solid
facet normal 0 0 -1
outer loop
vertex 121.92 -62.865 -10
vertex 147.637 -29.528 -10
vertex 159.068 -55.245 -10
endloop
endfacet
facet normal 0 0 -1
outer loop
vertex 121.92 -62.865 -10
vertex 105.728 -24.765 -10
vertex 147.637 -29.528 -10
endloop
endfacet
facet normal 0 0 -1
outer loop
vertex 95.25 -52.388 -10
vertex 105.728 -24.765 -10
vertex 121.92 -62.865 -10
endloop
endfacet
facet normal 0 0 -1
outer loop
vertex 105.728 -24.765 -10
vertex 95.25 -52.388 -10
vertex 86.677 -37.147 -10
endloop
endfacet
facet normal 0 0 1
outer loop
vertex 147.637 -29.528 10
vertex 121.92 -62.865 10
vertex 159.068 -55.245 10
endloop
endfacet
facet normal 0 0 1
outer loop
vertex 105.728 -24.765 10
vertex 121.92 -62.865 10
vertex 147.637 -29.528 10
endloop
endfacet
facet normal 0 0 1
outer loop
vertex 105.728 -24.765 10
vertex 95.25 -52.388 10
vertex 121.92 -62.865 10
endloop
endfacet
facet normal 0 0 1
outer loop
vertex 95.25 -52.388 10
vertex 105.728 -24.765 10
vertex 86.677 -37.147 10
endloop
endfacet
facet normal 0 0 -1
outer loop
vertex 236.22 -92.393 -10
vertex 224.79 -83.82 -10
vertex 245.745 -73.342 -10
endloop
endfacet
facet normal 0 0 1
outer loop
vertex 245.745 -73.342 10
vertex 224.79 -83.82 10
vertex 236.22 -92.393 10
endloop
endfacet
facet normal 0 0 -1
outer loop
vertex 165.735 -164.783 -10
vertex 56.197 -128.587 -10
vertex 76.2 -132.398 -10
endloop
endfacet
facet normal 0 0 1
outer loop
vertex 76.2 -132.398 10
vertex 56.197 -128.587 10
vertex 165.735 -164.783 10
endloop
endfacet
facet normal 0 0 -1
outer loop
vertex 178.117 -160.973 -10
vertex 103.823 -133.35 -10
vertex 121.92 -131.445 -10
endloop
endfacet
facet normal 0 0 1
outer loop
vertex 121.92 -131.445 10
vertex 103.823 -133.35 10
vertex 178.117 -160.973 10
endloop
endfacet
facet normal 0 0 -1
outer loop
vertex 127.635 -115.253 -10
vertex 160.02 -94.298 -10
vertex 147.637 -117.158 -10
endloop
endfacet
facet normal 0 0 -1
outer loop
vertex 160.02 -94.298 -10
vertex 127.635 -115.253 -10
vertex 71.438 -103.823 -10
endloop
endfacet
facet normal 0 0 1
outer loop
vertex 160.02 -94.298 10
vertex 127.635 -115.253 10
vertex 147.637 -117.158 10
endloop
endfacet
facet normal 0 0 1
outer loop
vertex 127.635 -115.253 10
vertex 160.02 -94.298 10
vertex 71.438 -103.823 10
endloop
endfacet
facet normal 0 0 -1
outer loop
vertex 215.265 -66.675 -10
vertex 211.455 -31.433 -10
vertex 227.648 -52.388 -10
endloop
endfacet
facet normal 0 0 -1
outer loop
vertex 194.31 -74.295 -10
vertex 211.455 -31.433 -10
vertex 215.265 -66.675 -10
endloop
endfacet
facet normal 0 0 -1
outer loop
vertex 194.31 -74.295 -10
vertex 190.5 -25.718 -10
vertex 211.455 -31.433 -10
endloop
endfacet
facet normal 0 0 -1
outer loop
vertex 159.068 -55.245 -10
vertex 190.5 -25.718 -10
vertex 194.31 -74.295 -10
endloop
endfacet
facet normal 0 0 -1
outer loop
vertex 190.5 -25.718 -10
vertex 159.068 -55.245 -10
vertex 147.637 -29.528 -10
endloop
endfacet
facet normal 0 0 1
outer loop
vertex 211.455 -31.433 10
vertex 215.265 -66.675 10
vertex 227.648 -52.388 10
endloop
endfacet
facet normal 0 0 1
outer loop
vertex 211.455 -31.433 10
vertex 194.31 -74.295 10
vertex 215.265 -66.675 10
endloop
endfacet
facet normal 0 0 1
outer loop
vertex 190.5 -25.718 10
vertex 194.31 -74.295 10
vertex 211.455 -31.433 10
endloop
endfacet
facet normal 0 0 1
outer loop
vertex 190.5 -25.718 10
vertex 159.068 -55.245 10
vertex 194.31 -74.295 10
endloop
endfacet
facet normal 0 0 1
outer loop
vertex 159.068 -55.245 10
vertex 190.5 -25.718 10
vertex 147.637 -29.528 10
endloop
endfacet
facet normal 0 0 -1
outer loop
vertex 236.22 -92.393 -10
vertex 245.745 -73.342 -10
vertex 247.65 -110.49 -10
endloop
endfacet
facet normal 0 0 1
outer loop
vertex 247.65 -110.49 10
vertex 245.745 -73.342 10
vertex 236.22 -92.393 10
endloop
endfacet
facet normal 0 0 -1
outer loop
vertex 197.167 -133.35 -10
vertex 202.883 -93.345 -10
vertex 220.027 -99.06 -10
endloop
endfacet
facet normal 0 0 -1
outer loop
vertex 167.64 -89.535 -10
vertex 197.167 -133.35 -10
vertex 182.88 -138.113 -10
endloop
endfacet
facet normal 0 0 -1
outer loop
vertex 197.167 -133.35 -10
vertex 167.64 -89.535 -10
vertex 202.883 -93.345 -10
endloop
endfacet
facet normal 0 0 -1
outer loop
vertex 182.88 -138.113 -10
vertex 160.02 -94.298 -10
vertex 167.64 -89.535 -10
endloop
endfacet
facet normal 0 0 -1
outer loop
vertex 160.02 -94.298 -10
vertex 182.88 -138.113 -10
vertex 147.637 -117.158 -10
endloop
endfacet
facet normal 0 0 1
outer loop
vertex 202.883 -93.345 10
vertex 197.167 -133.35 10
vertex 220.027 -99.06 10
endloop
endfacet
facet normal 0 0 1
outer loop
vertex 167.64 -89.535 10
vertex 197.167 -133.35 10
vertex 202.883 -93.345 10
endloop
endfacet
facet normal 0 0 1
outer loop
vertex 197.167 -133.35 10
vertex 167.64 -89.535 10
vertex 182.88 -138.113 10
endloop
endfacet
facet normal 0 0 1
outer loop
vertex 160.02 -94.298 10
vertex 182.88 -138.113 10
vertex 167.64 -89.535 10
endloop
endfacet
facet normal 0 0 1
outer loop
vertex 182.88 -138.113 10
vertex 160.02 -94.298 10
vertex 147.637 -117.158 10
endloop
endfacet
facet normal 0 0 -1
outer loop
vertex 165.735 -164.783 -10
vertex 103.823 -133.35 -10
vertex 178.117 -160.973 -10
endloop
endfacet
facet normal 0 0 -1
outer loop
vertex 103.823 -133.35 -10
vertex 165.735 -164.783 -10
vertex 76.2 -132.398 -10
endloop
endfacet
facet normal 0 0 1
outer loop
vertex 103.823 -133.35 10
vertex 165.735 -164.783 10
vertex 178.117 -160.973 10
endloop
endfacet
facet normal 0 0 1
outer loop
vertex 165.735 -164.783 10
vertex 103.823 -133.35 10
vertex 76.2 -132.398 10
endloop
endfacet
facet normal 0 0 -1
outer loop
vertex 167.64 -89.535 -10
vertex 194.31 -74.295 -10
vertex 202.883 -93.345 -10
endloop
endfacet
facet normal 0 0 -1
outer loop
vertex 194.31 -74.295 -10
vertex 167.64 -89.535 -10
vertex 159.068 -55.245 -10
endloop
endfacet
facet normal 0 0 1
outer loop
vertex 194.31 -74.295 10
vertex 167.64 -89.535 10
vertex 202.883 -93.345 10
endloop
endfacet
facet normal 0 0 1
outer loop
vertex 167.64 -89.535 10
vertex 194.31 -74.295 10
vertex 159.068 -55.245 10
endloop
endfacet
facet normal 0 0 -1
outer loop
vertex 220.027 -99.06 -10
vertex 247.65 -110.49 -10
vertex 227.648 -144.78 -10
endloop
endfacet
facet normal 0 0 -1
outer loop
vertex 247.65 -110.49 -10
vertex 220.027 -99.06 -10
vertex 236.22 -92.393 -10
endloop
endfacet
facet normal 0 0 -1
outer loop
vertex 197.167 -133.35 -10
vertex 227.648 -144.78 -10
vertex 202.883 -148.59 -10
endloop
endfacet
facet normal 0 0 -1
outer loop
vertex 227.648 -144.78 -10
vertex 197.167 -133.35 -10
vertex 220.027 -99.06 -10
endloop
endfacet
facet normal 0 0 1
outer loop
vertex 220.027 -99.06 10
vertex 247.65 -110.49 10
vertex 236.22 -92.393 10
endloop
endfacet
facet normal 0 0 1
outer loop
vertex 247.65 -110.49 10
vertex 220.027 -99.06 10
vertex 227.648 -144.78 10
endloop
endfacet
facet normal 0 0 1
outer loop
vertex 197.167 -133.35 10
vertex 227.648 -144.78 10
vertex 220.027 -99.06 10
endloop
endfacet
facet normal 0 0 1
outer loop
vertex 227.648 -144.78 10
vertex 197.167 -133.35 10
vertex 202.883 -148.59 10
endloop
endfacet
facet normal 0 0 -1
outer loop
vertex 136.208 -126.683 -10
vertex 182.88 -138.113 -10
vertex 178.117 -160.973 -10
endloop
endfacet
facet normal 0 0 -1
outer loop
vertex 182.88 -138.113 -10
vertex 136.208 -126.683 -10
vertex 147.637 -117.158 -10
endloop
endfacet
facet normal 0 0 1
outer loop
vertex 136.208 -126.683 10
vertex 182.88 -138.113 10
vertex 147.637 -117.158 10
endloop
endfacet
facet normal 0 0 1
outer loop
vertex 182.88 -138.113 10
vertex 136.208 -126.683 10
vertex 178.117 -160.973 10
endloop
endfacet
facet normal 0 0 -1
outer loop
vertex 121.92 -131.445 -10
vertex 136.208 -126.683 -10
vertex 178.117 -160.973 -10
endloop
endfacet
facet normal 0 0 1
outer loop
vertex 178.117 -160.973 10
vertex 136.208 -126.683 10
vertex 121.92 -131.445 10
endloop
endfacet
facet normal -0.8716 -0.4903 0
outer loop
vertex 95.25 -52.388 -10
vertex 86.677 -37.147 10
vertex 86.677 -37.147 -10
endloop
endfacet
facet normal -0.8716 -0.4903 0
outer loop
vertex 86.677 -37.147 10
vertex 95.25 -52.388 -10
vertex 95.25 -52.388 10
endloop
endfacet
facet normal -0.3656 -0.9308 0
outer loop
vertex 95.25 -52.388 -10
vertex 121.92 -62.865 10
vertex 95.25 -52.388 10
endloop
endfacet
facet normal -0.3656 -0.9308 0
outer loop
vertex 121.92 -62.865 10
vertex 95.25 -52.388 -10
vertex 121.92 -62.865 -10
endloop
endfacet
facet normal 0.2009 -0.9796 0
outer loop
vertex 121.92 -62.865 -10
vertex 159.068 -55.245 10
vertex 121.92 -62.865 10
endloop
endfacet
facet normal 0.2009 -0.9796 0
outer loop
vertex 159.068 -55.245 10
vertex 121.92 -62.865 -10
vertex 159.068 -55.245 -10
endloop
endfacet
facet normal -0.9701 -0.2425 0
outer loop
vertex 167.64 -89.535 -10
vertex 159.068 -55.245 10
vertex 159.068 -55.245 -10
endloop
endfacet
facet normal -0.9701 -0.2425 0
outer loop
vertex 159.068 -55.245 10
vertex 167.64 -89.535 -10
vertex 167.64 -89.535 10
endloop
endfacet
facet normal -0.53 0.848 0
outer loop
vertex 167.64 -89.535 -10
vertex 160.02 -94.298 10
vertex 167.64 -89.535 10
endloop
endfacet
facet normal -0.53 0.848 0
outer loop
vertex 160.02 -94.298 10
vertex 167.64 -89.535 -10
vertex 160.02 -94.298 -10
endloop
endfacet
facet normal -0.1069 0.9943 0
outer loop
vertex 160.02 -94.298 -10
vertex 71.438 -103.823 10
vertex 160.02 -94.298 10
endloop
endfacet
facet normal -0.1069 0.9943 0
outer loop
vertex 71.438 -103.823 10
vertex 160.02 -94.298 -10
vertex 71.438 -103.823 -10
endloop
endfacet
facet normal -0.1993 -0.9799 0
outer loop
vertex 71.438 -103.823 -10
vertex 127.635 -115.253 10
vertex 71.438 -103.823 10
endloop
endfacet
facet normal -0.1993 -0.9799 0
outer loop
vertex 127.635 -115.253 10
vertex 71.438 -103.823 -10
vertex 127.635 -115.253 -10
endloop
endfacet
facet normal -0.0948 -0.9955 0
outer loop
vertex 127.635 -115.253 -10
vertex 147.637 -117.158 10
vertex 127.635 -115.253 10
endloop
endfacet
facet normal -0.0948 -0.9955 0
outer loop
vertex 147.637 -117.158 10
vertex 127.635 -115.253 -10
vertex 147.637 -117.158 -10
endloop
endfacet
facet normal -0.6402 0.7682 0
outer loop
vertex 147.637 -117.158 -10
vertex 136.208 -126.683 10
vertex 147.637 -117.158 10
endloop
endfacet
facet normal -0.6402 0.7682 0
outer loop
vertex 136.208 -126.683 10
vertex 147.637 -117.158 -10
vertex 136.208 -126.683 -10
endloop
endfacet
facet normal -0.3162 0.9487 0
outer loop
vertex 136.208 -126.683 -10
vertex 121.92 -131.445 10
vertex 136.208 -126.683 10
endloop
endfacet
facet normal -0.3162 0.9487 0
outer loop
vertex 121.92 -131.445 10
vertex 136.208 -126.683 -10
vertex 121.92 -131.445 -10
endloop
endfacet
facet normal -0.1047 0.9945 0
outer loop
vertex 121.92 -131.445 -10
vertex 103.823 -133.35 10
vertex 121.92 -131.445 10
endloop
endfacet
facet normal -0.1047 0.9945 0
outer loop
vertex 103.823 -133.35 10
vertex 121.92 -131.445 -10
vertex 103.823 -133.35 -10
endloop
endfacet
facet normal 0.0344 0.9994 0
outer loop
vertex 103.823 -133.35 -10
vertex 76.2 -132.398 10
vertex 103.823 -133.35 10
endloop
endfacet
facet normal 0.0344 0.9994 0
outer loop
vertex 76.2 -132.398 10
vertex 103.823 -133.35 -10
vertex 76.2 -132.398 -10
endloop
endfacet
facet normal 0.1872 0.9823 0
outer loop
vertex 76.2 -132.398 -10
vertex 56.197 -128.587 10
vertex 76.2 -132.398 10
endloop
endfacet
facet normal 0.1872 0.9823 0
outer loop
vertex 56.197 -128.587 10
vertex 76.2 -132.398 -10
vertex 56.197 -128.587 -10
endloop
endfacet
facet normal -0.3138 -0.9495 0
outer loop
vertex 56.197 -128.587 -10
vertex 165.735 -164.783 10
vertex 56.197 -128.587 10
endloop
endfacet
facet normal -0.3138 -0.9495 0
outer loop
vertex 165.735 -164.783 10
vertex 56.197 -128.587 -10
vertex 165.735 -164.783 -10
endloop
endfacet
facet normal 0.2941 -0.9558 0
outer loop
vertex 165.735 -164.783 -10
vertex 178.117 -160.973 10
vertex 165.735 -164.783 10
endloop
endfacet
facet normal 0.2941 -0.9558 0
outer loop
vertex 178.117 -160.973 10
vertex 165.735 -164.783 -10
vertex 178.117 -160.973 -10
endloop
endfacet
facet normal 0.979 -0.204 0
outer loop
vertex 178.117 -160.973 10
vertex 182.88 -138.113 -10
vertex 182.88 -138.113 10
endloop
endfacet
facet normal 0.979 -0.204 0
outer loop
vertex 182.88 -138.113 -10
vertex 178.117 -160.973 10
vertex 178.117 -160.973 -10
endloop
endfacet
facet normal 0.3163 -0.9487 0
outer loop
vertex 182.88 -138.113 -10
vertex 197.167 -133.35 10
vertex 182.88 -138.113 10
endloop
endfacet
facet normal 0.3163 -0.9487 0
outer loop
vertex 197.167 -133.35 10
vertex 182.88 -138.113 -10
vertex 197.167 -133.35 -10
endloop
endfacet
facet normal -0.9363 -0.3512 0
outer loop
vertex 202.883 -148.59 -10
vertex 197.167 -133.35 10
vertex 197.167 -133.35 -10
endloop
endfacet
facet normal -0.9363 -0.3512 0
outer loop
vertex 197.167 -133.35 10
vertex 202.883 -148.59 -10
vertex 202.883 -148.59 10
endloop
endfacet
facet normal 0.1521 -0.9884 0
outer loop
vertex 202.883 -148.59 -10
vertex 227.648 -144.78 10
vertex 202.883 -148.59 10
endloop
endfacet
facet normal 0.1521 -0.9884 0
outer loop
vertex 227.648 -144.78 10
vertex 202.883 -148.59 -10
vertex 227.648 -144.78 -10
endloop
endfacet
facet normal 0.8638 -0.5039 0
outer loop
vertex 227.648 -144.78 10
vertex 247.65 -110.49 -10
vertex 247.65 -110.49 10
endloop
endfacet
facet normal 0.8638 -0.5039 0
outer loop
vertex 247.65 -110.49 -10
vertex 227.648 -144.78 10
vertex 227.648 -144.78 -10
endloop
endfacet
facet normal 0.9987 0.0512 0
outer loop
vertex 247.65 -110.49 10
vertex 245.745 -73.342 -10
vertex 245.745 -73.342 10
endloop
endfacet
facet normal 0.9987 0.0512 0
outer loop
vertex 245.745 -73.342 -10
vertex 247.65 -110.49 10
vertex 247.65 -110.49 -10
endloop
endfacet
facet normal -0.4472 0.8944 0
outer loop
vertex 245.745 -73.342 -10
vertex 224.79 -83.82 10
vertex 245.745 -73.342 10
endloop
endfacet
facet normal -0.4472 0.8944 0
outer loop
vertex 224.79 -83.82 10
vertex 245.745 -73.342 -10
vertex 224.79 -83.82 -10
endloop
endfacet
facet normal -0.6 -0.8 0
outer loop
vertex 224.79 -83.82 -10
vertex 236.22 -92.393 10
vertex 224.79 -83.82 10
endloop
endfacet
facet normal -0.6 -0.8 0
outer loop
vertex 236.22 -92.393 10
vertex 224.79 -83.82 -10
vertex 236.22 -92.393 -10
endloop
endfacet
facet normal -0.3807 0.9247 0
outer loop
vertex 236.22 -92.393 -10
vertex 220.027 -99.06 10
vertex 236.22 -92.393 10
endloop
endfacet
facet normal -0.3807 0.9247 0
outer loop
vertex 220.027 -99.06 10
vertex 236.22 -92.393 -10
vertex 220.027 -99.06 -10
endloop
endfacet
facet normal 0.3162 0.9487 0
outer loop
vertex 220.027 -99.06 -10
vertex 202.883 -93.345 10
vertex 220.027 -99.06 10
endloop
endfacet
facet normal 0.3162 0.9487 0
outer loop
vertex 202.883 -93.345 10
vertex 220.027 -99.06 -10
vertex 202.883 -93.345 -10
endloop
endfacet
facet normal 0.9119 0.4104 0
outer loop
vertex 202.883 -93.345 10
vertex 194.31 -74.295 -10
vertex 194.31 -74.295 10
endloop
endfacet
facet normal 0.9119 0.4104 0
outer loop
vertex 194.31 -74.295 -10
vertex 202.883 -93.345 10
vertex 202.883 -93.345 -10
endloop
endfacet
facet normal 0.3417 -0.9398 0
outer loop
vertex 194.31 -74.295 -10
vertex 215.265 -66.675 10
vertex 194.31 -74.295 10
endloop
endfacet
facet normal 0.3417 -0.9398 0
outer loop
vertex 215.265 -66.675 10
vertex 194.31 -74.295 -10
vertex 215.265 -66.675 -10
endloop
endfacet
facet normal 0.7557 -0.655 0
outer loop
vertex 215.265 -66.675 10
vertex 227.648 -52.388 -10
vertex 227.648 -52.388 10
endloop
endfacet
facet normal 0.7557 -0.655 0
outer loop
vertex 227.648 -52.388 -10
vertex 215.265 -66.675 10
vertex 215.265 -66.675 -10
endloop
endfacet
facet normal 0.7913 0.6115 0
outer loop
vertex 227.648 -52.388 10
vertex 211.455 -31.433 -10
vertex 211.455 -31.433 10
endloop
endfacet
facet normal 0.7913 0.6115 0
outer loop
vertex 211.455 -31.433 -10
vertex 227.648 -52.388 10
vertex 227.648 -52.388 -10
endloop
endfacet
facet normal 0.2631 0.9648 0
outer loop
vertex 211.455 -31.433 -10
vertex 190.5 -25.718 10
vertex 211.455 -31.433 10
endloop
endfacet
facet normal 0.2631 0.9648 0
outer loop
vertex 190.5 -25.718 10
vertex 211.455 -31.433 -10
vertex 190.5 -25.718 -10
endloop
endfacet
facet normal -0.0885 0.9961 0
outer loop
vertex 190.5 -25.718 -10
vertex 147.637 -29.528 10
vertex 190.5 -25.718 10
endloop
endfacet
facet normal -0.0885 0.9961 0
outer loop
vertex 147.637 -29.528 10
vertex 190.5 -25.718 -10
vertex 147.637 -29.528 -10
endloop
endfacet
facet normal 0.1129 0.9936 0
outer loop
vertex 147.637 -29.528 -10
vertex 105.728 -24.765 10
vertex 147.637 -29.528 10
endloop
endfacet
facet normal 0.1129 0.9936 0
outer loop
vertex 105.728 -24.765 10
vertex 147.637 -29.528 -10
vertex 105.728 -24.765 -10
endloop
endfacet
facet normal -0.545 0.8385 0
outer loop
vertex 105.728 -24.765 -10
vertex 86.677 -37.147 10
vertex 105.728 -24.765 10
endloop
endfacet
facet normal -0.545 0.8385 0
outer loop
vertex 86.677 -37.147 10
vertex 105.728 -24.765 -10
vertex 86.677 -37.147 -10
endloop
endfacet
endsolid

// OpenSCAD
polyhedron(
    points=[
    [86.6775, -37.1475, -10],
    [95.25, -52.3875, -10],
    [121.92, -62.865, -10],
    [159.0675, -55.245, -10],
    [167.64, -89.535, -10],
    [160.02, -94.2975, -10],
    [71.4375, -103.8225, -10],
    [127.635, -115.2525, -10],
    [147.6375, -117.1575, -10],
    [136.2075, -126.6825, -10],
    [121.92, -131.445, -10],
    [103.8225, -133.35, -10],
    [76.2, -132.3975, -10],
    [56.1975, -128.5875, -10],
    [165.735, -164.7825, -10],
    [178.1175, -160.9725, -10],
    [182.88, -138.1125, -10],
    [197.1675, -133.35, -10],
    [202.8825, -148.59, -10],
    [227.6475, -144.78, -10],
    [247.65, -110.49, -10],
    [245.745, -73.3425, -10],
    [224.79, -83.82, -10],
    [236.22, -92.3925, -10],
    [220.0275, -99.06, -10],
    [202.8825, -93.345, -10],
    [194.31, -74.295, -10],
    [215.265, -66.675, -10],
    [227.6475, -52.3875, -10],
    [211.455, -31.4325, -10],
    [190.5, -25.7175, -10],
    [147.6375, -29.5275, -10],
    [105.7275, -24.765, -10],
    [86.6775, -37.1475, 10],
    [95.25, -52.3875, 10],
    [121.92, -62.865, 10],
    [159.0675, -55.245, 10],
    [167.64, -89.535, 10],
    [160.02, -94.2975, 10],
    [71.4375, -103.8225, 10],
    [127.635, -115.2525, 10],
    [147.6375, -117.1575, 10],
    [136.2075, -126.6825, 10],
    [121.92, -131.445, 10],
    [103.8225, -133.35, 10],
    [76.2, -132.3975, 10],
    [56.1975, -128.5875, 10],
    [165.735, -164.7825, 10],
    [178.1175, -160.9725, 10],
    [182.88, -138.1125, 10],
    [197.1675, -133.35, 10],
    [202.8825, -148.59, 10],
    [227.6475, -144.78, 10],
    [247.65, -110.49, 10],
    [245.745, -73.3425, 10],
    [224.79, -83.82, 10],
    [236.22, -92.3925, 10],
    [220.0275, -99.06, 10],
    [202.8825, -93.345, 10],
    [194.31, -74.295, 10],
    [215.265, -66.675, 10],
    [227.6475, -52.3875, 10],
    [211.455, -31.4325, 10],
    [190.5, -25.7175, 10],
    [147.6375, -29.5275, 10],
    [105.7275, -24.765, 10],
    ],
    faces=[
        [31,32,0,1,2,3],
        [36,35,34,33,65,64],
        [21,22,23],
        [56,55,54],
        [12,13,14],
        [47,46,45],
        [10,11,15],
        [48,44,43],
        [5,6,7,8],
        [41,40,39,38],
        [26,27,28,29,30,31,3],
        [36,64,63,62,61,60,59],
        [20,21,23],
        [56,54,53],
        [16,17,24,25,4,5,8],
        [41,38,37,58,57,50,49],
        [11,12,14,15],
        [48,47,45,44],
        [25,26,3,4],
        [37,36,59,58],
        [17,18,19,20,23,24],
        [57,56,53,52,51,50],
        [8,9,15,16],
        [49,48,42,41],
        [15,9,10],
        [43,42,48],
        [0,33,34,1],
        [1,34,35,2],
        [2,35,36,3],
        [3,36,37,4],
        [4,37,38,5],
        [5,38,39,6],
        [6,39,40,7],
        [7,40,41,8],
        [8,41,42,9],
        [9,42,43,10],
        [10,43,44,11],
        [11,44,45,12],
        [12,45,46,13],
        [13,46,47,14],
        [14,47,48,15],
        [15,48,49,16],
        [16,49,50,17],
        [17,50,51,18],
        [18,51,52,19],
        [19,52,53,20],
        [20,53,54,21],
        [21,54,55,22],
        [22,55,56,23],
        [23,56,57,24],
        [24,57,58,25],
        [25,58,59,26],
        [26,59,60,27],
        [27,60,61,28],
        [28,61,62,29],
        [29,62,63,30],
        [30,63,64,31],
        [31,64,65,32],
        [32,65,33,0],
    ]
);
